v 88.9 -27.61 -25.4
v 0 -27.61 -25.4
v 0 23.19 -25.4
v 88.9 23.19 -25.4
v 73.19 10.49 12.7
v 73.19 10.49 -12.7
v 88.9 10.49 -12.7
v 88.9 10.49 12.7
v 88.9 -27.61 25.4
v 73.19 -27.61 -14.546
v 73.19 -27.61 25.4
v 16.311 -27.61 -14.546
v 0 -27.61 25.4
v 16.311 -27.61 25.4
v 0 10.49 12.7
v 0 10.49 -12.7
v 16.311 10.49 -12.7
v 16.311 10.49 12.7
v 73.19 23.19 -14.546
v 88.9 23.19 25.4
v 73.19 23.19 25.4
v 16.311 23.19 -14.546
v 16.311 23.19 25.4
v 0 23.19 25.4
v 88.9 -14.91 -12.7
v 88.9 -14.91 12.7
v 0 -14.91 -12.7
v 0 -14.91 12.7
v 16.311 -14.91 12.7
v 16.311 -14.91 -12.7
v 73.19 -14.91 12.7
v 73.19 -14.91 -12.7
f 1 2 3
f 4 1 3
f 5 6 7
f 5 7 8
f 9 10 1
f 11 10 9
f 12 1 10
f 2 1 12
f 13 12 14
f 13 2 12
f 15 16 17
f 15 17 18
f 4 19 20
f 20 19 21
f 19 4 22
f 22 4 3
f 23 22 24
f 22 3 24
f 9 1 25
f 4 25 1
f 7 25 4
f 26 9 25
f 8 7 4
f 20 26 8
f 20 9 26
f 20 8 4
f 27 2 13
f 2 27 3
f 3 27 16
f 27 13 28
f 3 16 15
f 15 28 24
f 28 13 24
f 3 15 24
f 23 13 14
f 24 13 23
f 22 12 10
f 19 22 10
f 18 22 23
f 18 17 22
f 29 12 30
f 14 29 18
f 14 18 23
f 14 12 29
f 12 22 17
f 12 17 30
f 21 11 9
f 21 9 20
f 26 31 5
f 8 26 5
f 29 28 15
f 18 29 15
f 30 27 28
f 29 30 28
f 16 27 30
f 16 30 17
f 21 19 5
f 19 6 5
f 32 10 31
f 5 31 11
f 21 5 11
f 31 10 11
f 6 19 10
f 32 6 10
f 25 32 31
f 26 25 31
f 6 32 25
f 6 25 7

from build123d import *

# Parameters (mm, degrees)
F0_W     = 50.8
F0_H     = 50.8
F0_W_2   = 25.4
F0_H_2   = 25.4
F1_DEPTH = 88.9
F2_W     = 56.879024
F2_H     = 39.945584
F3_DEPTH = 50.8


with BuildPart() as f1:
    # F0 (on Right) → F1 (new body)
    with BuildSketch(Plane.YZ):
        with Locations((-2.20958, 0)):
            Rectangle(F0_W, F0_H)
        with Locations((-2.20958, 0)):
            Rectangle(F0_W_2, F0_H_2, mode=Mode.SUBTRACT)
    extrude(amount=F1_DEPTH)

    # F2 (on face) → F3 (cut)
    with BuildSketch(Plane.XZ.offset(27.60958)):
        with Locations((44.750276, 5.427208)):
            Rectangle(F2_W, F2_H)
    extrude(amount=-F3_DEPTH, mode=Mode.SUBTRACT)


solid = f1.part
